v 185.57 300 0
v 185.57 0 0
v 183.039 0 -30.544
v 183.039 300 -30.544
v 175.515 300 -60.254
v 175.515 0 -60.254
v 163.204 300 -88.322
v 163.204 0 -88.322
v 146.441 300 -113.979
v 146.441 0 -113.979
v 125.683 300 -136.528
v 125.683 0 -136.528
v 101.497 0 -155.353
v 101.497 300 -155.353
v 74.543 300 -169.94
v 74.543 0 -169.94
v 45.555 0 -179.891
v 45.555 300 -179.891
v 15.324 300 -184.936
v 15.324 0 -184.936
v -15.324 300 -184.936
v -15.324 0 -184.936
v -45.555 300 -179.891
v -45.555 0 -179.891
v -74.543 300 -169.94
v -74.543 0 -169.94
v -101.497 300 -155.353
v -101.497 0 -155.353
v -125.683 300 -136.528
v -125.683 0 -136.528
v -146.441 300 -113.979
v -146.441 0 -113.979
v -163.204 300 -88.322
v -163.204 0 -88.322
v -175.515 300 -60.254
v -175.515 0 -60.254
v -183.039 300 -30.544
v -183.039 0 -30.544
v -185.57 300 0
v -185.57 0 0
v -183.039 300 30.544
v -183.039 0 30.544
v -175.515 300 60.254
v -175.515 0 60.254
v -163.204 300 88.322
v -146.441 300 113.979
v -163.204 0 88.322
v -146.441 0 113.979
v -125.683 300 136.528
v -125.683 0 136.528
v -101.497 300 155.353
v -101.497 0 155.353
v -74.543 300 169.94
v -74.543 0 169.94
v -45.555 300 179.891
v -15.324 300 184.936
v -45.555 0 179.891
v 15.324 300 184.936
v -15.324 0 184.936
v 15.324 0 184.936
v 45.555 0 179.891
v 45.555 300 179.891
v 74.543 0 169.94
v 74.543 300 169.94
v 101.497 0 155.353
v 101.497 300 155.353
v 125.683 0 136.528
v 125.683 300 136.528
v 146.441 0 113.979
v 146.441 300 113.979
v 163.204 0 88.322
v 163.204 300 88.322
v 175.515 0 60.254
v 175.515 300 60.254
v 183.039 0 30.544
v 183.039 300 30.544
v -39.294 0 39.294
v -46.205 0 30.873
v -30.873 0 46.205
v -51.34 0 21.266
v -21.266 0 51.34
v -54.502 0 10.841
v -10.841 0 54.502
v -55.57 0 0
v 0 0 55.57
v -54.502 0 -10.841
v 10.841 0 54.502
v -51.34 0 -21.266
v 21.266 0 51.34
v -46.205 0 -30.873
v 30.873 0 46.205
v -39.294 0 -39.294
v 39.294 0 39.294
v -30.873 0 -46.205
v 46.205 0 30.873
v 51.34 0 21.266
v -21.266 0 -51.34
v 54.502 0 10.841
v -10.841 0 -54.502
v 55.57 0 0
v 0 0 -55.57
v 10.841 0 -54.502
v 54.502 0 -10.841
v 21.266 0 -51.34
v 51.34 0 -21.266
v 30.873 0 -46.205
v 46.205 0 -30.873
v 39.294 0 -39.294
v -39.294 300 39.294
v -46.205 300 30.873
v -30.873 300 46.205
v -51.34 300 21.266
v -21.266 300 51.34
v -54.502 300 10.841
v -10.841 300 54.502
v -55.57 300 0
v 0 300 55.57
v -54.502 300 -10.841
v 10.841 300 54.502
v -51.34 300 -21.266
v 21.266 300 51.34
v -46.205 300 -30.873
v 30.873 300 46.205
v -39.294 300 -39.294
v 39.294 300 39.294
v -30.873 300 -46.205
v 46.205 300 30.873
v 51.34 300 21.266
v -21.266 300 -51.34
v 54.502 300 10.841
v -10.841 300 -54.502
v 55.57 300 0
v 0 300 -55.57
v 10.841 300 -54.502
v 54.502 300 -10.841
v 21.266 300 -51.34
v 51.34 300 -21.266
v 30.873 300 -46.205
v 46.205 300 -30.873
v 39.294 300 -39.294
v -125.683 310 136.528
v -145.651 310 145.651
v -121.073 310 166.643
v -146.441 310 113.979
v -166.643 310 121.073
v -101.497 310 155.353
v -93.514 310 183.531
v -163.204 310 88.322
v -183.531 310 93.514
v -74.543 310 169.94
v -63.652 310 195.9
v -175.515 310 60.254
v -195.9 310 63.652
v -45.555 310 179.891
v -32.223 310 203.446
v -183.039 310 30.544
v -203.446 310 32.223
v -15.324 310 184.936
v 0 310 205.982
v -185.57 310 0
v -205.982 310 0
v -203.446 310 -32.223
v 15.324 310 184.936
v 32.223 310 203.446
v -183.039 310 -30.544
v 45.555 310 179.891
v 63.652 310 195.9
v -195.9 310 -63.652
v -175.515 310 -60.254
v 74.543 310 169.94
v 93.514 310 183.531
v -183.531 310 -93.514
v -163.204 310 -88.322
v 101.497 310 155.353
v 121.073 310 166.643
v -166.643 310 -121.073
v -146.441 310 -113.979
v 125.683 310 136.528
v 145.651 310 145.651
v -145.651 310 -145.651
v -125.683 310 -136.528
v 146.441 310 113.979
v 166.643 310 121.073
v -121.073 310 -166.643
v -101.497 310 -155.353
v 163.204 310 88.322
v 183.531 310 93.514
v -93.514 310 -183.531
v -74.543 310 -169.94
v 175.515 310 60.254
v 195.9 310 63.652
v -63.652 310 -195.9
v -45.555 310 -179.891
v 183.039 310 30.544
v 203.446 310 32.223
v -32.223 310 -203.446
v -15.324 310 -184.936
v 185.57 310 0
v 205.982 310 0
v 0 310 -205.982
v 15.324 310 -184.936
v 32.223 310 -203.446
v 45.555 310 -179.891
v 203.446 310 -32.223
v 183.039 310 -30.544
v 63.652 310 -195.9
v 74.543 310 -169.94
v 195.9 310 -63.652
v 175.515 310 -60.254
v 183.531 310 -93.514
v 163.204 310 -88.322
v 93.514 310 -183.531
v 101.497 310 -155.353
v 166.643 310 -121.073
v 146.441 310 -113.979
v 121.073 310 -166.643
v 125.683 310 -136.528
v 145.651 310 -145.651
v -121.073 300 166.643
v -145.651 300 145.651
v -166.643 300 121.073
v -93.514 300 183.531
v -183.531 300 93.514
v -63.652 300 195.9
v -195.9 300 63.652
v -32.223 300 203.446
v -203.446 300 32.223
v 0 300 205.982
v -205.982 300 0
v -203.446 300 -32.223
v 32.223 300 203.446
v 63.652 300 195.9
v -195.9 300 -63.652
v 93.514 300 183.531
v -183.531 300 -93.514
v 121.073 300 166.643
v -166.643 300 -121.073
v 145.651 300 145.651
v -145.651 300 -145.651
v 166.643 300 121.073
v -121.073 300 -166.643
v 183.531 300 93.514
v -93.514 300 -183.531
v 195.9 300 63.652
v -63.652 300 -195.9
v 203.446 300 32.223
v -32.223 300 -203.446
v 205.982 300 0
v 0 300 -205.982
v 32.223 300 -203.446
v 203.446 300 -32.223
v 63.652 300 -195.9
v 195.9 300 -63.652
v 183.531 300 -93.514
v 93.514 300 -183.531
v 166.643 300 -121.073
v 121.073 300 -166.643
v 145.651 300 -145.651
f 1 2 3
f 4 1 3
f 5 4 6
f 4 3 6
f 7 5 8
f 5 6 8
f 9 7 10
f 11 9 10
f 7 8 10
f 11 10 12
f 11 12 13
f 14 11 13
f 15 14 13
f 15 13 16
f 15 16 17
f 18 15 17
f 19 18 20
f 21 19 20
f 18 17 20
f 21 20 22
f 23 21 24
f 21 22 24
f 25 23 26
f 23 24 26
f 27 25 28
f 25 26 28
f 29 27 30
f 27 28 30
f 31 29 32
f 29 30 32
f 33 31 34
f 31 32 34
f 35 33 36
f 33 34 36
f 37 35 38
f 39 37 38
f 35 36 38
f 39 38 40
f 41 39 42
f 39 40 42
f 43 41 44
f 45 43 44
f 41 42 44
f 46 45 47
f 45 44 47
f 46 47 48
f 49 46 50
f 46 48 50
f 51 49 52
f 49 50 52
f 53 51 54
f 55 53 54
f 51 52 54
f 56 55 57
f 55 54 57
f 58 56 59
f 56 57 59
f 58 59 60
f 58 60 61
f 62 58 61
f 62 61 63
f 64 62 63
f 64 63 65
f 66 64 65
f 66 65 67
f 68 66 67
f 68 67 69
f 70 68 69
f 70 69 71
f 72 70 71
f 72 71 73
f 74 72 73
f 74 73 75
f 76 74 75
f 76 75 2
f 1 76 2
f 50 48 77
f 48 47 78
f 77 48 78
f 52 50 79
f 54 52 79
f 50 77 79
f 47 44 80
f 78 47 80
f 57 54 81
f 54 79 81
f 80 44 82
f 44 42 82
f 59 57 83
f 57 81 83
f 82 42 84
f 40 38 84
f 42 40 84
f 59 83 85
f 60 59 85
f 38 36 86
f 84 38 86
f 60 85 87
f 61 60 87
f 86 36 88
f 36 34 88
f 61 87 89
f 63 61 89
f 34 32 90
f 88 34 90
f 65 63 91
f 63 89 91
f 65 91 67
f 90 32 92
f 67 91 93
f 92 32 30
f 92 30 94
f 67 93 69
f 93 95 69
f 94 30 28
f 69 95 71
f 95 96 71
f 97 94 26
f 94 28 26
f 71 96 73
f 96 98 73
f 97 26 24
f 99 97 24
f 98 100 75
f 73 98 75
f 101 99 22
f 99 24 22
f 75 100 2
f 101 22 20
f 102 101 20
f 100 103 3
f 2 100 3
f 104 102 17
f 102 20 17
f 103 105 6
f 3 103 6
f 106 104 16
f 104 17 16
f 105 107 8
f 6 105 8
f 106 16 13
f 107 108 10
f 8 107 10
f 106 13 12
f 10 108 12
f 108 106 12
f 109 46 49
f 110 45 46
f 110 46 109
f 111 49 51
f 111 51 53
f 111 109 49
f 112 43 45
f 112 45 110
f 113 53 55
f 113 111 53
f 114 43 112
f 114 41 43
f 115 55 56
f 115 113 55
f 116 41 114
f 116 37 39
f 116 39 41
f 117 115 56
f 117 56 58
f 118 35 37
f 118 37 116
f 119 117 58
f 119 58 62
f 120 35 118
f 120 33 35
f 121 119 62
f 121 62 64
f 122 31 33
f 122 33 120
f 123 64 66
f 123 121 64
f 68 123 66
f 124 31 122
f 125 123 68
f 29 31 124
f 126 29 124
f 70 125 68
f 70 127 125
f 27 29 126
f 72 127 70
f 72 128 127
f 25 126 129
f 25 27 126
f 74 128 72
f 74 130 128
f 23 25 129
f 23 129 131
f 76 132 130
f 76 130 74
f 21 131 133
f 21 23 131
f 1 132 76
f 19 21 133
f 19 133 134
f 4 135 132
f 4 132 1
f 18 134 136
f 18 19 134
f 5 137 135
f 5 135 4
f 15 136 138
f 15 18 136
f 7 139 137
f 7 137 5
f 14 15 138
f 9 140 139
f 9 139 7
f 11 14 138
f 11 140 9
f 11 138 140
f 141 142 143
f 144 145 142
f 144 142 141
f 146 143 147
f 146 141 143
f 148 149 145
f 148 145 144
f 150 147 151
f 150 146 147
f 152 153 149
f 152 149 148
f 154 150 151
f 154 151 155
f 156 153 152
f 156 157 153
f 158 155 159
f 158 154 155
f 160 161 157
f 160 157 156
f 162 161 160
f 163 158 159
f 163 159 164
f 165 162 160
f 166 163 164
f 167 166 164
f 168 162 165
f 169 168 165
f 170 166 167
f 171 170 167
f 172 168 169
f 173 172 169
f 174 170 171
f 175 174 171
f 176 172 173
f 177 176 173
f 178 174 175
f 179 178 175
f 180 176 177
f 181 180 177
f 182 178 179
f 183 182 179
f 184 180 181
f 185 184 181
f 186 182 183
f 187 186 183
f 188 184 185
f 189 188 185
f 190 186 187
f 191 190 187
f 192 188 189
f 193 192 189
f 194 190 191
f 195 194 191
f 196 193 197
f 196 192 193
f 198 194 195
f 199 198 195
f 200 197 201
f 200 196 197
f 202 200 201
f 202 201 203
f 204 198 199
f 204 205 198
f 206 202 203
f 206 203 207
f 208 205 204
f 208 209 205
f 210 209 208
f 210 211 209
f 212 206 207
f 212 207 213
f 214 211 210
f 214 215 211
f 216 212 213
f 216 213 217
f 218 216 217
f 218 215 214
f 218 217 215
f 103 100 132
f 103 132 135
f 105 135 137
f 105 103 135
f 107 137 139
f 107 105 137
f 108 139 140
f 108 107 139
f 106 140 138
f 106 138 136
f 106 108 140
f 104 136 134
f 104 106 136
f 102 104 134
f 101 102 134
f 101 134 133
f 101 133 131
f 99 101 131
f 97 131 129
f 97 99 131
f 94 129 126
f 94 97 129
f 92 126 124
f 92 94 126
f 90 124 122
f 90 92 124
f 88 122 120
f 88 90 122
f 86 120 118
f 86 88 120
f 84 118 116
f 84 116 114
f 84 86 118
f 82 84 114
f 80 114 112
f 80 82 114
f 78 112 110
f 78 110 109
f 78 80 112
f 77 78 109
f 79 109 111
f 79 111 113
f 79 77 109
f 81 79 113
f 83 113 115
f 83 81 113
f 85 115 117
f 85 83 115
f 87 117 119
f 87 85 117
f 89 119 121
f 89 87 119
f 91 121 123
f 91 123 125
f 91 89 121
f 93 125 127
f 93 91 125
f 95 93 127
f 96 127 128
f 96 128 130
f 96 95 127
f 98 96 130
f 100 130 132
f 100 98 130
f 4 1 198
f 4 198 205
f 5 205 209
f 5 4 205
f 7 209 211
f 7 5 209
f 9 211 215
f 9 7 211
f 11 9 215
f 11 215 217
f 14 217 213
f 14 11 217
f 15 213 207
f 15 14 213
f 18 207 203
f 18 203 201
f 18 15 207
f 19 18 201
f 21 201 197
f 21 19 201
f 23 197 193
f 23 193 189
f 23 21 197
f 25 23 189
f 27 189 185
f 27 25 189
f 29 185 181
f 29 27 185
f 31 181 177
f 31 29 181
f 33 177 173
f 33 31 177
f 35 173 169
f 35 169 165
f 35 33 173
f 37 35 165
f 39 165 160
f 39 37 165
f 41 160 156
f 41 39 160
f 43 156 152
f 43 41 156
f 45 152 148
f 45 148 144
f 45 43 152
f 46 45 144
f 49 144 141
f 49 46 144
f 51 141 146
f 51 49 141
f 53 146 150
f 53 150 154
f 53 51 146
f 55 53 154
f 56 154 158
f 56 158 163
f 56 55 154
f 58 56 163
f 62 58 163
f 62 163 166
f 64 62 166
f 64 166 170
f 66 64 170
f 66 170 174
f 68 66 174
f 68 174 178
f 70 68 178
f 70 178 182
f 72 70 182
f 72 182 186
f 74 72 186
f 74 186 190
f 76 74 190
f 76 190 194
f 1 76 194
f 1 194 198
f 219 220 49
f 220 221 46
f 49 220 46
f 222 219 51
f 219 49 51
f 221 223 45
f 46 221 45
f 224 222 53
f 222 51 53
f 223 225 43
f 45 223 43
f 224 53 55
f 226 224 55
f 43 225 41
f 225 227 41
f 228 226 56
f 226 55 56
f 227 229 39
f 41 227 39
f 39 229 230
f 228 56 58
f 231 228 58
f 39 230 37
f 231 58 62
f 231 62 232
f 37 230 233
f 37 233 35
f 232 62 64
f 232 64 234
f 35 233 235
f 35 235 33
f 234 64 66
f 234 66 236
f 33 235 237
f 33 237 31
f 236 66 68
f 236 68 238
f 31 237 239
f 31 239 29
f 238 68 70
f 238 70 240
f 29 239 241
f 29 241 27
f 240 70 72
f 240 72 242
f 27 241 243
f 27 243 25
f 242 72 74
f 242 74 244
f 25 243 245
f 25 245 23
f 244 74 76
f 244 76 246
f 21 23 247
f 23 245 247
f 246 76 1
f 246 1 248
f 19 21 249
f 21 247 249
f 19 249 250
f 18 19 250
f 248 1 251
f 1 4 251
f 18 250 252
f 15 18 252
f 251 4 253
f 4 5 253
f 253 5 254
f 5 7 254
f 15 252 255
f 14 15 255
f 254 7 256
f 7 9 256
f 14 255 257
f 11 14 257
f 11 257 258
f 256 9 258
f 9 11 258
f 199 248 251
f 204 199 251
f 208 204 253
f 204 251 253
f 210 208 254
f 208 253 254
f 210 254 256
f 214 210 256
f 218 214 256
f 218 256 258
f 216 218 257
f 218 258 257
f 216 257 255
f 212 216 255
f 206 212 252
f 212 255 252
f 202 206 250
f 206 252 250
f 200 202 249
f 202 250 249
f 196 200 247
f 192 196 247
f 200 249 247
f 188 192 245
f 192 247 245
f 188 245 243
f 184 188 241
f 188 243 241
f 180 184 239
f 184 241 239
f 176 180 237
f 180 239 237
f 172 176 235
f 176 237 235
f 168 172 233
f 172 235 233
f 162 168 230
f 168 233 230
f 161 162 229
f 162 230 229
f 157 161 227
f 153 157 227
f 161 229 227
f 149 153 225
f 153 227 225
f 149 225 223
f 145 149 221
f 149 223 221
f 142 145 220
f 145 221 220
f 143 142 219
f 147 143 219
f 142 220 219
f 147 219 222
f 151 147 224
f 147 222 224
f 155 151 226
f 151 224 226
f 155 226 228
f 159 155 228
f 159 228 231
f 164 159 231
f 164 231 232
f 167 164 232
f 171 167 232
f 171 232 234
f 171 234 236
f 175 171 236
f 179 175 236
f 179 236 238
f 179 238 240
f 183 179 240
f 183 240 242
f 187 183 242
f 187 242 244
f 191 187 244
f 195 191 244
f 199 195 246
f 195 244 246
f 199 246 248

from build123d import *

# Parameters (mm, degrees)
CROQUIS1_R              = 185.569887542
CROQUIS1_R_2            = 55.569887542
SALIENTE_EXTRUIR1_DEPTH = 300
CROQUIS2_R              = 205.981548736
CROQUIS2_R_2            = 185.569887542
SALIENTE_EXTRUIR2_DEPTH = 10


with BuildPart() as part:
    # Croquis1 → Saliente-Extruir1 (new body)
    with BuildSketch(Plane(origin=(0, 0, 0), x_dir=(1, 0, 0), z_dir=(0, 1, 0))):
        Circle(CROQUIS1_R)
        Circle(CROQUIS1_R_2, mode=Mode.SUBTRACT)
    extrude(amount=SALIENTE_EXTRUIR1_DEPTH)


with BuildPart() as body_2:
    # Croquis2 → Saliente-Extruir2 (new body)
    with BuildSketch(Plane(origin=(0, 300, 0), x_dir=(1, 0, 0), z_dir=(0, 1, 0))):
        Circle(CROQUIS2_R)
        Circle(CROQUIS2_R_2, mode=Mode.SUBTRACT)
    extrude(amount=SALIENTE_EXTRUIR2_DEPTH)


solid = Compound([part.part, body_2.part])
